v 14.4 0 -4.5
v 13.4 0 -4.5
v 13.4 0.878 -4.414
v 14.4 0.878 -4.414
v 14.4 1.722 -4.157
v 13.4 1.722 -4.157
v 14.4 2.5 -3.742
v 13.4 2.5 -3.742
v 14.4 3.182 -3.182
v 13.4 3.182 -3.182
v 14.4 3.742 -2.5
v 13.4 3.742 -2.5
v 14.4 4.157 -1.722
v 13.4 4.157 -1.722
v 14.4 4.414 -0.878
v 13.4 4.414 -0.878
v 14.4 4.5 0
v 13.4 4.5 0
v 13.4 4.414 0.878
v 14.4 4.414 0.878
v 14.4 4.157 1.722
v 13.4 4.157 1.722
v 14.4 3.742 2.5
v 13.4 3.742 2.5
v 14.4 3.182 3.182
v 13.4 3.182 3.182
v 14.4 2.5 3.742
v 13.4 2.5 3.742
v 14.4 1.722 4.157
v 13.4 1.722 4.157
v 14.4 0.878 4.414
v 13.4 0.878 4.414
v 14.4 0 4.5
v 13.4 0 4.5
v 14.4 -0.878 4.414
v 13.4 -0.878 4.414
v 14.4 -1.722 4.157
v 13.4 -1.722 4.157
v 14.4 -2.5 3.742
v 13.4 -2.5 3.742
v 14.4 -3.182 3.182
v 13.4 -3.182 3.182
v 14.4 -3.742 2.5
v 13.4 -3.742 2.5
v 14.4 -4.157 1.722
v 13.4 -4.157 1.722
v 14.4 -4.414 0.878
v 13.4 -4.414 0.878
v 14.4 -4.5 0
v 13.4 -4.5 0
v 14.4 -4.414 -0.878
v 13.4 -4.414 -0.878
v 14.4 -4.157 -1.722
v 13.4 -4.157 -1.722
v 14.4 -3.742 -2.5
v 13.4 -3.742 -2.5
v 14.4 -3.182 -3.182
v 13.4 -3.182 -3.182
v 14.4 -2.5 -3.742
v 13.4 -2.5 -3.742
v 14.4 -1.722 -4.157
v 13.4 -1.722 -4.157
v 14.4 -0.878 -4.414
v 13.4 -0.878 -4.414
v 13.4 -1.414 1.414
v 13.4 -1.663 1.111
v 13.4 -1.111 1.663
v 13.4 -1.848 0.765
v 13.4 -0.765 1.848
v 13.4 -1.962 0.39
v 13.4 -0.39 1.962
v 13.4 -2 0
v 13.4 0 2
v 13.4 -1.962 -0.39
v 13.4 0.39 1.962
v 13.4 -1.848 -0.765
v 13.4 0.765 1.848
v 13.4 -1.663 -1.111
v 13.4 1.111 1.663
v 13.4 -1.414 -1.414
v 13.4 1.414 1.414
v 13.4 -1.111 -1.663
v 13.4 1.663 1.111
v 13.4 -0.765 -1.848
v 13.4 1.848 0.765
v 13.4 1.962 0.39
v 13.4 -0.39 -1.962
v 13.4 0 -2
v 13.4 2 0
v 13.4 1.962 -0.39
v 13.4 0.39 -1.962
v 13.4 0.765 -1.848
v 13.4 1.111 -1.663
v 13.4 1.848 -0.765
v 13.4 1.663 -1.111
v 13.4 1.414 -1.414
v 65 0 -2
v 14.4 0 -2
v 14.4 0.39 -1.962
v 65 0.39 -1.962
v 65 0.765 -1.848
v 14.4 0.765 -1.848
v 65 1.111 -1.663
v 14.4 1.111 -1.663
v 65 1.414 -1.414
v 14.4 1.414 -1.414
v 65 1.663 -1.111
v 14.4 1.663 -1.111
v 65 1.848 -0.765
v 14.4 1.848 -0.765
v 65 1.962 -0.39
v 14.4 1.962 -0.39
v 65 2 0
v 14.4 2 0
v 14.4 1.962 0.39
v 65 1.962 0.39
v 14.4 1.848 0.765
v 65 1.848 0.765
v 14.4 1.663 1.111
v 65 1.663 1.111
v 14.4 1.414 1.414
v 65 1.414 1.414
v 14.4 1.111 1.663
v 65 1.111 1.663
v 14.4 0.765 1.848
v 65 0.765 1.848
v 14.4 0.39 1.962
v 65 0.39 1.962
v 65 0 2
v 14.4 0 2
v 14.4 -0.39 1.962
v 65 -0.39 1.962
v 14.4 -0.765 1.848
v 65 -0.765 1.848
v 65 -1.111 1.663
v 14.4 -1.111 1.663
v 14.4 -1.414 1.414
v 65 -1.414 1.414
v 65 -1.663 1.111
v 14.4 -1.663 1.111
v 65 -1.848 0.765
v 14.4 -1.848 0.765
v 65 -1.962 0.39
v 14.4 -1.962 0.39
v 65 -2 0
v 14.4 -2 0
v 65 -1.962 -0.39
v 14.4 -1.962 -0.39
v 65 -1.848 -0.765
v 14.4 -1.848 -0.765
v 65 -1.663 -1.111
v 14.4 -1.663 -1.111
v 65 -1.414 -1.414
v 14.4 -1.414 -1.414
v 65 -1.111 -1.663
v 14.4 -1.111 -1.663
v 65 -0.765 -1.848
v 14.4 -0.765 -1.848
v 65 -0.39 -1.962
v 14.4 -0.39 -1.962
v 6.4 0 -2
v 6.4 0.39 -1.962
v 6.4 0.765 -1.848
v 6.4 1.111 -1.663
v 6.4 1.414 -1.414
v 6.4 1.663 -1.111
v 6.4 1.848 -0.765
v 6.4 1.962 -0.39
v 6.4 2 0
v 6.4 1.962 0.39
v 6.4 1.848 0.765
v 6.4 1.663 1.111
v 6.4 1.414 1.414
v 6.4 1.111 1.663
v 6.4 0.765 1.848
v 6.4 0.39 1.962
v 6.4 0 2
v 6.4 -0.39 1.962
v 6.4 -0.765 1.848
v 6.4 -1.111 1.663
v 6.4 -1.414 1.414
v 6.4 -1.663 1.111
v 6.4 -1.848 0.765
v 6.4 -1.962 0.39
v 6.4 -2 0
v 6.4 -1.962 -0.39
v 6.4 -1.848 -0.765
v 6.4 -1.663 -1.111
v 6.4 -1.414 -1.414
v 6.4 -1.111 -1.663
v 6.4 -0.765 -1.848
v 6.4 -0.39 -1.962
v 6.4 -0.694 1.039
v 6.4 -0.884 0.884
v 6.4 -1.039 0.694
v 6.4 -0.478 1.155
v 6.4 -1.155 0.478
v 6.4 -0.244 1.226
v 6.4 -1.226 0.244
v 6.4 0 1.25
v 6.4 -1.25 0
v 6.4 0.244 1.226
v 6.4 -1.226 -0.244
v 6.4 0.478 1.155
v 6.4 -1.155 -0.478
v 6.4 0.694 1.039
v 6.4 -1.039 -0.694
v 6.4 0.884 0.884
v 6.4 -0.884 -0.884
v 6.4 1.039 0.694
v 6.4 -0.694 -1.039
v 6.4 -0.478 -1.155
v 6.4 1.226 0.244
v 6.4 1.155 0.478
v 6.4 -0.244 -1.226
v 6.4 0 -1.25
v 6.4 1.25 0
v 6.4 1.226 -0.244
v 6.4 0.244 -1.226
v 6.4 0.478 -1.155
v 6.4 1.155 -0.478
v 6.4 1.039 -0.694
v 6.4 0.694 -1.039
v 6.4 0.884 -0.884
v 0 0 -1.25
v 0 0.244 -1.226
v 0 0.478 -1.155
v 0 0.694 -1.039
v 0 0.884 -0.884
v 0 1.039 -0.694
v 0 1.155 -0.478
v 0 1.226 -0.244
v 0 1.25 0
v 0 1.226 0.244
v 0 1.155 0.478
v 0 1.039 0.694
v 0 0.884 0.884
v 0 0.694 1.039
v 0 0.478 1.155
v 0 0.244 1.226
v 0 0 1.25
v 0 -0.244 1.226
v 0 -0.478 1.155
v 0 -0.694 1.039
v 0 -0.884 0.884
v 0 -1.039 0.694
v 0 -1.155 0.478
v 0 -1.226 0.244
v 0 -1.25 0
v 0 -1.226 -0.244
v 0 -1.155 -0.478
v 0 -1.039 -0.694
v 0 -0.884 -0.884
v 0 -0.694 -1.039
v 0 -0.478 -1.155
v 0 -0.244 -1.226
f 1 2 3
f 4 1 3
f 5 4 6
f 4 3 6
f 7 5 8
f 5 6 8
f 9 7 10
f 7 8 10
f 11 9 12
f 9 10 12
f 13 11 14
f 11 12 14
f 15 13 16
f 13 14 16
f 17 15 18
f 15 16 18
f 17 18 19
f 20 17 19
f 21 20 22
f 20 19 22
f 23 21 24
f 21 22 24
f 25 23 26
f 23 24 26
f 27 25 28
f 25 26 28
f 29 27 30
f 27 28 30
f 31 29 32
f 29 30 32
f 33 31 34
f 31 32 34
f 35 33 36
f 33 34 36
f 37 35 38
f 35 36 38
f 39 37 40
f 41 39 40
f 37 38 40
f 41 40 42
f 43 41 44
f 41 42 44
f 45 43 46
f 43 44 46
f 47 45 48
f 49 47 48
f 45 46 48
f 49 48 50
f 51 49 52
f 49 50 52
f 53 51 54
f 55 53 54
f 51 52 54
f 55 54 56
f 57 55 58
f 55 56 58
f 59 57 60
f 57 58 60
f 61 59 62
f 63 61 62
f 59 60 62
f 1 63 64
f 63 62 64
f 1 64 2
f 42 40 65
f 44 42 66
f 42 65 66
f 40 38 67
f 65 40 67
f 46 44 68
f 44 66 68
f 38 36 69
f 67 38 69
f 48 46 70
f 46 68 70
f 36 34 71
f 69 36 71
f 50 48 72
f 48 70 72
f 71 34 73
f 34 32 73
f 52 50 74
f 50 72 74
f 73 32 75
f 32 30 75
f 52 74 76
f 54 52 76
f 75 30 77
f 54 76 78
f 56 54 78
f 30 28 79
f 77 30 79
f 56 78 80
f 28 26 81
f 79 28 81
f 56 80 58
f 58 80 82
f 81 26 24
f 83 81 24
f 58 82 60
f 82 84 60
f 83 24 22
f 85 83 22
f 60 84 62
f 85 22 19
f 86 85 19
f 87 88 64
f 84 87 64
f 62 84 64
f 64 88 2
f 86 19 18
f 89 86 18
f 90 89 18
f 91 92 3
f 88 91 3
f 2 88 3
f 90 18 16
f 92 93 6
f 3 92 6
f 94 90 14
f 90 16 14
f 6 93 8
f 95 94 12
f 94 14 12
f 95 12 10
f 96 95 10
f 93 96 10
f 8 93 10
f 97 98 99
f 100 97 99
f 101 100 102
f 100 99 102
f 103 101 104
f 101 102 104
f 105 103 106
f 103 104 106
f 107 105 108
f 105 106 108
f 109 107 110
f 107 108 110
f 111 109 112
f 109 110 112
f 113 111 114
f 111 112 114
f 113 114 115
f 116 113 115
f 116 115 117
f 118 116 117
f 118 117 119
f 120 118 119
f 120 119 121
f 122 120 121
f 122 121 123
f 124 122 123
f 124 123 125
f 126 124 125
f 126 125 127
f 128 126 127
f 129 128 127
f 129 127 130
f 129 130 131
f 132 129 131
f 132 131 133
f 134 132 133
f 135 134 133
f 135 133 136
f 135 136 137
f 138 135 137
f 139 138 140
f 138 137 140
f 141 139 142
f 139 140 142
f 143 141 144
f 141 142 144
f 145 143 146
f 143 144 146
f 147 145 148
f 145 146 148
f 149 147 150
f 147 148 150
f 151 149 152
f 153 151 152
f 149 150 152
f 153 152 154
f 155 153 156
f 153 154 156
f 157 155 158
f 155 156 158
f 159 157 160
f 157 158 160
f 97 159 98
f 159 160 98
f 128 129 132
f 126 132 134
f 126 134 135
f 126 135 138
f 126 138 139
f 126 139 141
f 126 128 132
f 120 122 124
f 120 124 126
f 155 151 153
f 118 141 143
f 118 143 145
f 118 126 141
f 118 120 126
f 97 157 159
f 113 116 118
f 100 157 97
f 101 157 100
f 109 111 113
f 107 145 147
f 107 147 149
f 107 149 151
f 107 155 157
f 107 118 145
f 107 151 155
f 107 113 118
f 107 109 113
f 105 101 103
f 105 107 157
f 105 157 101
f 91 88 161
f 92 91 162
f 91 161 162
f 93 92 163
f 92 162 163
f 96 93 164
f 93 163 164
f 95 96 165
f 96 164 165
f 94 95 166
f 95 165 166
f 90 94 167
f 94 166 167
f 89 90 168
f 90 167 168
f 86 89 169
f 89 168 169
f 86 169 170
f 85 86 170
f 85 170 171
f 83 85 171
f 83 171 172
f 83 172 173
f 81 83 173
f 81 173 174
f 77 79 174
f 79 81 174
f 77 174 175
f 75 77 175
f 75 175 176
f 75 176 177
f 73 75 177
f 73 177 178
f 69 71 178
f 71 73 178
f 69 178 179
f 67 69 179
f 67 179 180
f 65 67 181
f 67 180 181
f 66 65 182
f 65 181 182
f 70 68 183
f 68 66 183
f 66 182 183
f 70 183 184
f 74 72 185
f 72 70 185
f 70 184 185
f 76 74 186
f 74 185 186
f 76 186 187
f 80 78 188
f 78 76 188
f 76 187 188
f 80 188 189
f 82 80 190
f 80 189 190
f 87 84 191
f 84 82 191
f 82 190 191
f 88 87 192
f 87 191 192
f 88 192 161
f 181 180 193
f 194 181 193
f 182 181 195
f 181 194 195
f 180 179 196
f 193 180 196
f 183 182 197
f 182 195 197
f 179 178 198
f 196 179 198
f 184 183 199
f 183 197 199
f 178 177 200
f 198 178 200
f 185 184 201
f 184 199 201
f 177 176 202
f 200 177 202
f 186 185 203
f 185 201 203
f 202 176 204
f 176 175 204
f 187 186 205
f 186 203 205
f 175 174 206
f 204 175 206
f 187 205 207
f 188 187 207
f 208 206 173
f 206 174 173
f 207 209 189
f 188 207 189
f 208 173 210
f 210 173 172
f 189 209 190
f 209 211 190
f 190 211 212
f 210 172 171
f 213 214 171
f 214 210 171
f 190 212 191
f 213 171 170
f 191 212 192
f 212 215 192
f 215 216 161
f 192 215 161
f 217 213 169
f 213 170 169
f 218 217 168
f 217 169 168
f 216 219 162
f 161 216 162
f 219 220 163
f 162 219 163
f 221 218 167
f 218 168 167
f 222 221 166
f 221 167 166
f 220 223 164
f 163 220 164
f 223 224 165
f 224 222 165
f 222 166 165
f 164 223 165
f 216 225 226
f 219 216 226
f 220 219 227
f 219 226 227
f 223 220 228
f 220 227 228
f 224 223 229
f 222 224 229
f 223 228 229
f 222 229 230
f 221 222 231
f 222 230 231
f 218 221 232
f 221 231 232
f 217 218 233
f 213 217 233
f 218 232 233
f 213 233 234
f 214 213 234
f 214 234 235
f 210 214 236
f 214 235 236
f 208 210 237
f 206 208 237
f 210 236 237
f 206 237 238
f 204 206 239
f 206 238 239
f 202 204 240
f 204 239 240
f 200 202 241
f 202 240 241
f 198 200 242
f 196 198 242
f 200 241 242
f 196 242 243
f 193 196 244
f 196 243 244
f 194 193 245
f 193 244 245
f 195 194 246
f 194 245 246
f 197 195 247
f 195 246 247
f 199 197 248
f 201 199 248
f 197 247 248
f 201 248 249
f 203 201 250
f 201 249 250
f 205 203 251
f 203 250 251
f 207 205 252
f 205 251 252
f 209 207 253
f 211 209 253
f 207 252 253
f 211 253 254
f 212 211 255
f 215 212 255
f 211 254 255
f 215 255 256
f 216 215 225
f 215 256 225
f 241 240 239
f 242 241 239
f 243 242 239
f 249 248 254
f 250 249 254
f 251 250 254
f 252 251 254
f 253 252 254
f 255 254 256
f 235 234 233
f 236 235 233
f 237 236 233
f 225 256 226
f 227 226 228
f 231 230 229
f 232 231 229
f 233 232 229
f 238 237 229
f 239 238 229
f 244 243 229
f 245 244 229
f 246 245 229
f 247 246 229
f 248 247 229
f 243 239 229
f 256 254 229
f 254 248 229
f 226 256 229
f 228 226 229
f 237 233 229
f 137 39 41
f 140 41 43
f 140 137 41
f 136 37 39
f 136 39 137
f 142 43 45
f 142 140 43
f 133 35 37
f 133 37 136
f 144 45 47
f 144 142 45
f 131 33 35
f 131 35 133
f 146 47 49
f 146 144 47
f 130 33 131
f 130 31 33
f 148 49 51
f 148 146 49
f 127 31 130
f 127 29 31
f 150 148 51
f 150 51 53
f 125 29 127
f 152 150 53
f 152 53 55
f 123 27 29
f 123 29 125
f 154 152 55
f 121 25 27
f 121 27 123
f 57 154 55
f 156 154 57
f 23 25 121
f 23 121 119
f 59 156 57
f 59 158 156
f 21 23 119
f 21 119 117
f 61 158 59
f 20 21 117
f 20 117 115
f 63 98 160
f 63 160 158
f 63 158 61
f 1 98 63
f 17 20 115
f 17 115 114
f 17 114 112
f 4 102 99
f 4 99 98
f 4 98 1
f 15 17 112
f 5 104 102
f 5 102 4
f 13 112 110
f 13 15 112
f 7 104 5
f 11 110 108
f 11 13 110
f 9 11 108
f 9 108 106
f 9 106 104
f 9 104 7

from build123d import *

# Parameters (mm, degrees)
SKETCH1_R           = 2
BOSS_EXTRUDE1_DEPTH = 65
SKETCH2_R           = 4.5
BOSS_EXTRUDE2_DEPTH = 1
SKETCH3_R           = 2
SKETCH3_R_2         = 1.25
CUT_EXTRUDE1_DEPTH  = 6.4


with BuildPart() as part:
    # Sketch1 → Boss-Extrude1 (new body)
    with BuildSketch(Plane(origin=(0, 0, 0), x_dir=(0, 0, -1), z_dir=(1, 0, 0))):
        Circle(SKETCH1_R)
    extrude(amount=BOSS_EXTRUDE1_DEPTH)

    # Sketch2 → Boss-Extrude2 (add)
    with BuildSketch(Plane(origin=(13.4, 0, 0), x_dir=(0, 0, -1), z_dir=(1, 0, 0))):
        Circle(SKETCH2_R)
    extrude(amount=BOSS_EXTRUDE2_DEPTH)

    # Sketch3 → Cut-Extrude1 (cut)
    with BuildSketch(Plane(origin=(0, 0, 0), x_dir=(0, 0, -1), z_dir=(1, 0, 0))):
        Circle(SKETCH3_R)
        Circle(SKETCH3_R_2, mode=Mode.SUBTRACT)
    extrude(amount=CUT_EXTRUDE1_DEPTH, mode=Mode.SUBTRACT)


solid = part.part
